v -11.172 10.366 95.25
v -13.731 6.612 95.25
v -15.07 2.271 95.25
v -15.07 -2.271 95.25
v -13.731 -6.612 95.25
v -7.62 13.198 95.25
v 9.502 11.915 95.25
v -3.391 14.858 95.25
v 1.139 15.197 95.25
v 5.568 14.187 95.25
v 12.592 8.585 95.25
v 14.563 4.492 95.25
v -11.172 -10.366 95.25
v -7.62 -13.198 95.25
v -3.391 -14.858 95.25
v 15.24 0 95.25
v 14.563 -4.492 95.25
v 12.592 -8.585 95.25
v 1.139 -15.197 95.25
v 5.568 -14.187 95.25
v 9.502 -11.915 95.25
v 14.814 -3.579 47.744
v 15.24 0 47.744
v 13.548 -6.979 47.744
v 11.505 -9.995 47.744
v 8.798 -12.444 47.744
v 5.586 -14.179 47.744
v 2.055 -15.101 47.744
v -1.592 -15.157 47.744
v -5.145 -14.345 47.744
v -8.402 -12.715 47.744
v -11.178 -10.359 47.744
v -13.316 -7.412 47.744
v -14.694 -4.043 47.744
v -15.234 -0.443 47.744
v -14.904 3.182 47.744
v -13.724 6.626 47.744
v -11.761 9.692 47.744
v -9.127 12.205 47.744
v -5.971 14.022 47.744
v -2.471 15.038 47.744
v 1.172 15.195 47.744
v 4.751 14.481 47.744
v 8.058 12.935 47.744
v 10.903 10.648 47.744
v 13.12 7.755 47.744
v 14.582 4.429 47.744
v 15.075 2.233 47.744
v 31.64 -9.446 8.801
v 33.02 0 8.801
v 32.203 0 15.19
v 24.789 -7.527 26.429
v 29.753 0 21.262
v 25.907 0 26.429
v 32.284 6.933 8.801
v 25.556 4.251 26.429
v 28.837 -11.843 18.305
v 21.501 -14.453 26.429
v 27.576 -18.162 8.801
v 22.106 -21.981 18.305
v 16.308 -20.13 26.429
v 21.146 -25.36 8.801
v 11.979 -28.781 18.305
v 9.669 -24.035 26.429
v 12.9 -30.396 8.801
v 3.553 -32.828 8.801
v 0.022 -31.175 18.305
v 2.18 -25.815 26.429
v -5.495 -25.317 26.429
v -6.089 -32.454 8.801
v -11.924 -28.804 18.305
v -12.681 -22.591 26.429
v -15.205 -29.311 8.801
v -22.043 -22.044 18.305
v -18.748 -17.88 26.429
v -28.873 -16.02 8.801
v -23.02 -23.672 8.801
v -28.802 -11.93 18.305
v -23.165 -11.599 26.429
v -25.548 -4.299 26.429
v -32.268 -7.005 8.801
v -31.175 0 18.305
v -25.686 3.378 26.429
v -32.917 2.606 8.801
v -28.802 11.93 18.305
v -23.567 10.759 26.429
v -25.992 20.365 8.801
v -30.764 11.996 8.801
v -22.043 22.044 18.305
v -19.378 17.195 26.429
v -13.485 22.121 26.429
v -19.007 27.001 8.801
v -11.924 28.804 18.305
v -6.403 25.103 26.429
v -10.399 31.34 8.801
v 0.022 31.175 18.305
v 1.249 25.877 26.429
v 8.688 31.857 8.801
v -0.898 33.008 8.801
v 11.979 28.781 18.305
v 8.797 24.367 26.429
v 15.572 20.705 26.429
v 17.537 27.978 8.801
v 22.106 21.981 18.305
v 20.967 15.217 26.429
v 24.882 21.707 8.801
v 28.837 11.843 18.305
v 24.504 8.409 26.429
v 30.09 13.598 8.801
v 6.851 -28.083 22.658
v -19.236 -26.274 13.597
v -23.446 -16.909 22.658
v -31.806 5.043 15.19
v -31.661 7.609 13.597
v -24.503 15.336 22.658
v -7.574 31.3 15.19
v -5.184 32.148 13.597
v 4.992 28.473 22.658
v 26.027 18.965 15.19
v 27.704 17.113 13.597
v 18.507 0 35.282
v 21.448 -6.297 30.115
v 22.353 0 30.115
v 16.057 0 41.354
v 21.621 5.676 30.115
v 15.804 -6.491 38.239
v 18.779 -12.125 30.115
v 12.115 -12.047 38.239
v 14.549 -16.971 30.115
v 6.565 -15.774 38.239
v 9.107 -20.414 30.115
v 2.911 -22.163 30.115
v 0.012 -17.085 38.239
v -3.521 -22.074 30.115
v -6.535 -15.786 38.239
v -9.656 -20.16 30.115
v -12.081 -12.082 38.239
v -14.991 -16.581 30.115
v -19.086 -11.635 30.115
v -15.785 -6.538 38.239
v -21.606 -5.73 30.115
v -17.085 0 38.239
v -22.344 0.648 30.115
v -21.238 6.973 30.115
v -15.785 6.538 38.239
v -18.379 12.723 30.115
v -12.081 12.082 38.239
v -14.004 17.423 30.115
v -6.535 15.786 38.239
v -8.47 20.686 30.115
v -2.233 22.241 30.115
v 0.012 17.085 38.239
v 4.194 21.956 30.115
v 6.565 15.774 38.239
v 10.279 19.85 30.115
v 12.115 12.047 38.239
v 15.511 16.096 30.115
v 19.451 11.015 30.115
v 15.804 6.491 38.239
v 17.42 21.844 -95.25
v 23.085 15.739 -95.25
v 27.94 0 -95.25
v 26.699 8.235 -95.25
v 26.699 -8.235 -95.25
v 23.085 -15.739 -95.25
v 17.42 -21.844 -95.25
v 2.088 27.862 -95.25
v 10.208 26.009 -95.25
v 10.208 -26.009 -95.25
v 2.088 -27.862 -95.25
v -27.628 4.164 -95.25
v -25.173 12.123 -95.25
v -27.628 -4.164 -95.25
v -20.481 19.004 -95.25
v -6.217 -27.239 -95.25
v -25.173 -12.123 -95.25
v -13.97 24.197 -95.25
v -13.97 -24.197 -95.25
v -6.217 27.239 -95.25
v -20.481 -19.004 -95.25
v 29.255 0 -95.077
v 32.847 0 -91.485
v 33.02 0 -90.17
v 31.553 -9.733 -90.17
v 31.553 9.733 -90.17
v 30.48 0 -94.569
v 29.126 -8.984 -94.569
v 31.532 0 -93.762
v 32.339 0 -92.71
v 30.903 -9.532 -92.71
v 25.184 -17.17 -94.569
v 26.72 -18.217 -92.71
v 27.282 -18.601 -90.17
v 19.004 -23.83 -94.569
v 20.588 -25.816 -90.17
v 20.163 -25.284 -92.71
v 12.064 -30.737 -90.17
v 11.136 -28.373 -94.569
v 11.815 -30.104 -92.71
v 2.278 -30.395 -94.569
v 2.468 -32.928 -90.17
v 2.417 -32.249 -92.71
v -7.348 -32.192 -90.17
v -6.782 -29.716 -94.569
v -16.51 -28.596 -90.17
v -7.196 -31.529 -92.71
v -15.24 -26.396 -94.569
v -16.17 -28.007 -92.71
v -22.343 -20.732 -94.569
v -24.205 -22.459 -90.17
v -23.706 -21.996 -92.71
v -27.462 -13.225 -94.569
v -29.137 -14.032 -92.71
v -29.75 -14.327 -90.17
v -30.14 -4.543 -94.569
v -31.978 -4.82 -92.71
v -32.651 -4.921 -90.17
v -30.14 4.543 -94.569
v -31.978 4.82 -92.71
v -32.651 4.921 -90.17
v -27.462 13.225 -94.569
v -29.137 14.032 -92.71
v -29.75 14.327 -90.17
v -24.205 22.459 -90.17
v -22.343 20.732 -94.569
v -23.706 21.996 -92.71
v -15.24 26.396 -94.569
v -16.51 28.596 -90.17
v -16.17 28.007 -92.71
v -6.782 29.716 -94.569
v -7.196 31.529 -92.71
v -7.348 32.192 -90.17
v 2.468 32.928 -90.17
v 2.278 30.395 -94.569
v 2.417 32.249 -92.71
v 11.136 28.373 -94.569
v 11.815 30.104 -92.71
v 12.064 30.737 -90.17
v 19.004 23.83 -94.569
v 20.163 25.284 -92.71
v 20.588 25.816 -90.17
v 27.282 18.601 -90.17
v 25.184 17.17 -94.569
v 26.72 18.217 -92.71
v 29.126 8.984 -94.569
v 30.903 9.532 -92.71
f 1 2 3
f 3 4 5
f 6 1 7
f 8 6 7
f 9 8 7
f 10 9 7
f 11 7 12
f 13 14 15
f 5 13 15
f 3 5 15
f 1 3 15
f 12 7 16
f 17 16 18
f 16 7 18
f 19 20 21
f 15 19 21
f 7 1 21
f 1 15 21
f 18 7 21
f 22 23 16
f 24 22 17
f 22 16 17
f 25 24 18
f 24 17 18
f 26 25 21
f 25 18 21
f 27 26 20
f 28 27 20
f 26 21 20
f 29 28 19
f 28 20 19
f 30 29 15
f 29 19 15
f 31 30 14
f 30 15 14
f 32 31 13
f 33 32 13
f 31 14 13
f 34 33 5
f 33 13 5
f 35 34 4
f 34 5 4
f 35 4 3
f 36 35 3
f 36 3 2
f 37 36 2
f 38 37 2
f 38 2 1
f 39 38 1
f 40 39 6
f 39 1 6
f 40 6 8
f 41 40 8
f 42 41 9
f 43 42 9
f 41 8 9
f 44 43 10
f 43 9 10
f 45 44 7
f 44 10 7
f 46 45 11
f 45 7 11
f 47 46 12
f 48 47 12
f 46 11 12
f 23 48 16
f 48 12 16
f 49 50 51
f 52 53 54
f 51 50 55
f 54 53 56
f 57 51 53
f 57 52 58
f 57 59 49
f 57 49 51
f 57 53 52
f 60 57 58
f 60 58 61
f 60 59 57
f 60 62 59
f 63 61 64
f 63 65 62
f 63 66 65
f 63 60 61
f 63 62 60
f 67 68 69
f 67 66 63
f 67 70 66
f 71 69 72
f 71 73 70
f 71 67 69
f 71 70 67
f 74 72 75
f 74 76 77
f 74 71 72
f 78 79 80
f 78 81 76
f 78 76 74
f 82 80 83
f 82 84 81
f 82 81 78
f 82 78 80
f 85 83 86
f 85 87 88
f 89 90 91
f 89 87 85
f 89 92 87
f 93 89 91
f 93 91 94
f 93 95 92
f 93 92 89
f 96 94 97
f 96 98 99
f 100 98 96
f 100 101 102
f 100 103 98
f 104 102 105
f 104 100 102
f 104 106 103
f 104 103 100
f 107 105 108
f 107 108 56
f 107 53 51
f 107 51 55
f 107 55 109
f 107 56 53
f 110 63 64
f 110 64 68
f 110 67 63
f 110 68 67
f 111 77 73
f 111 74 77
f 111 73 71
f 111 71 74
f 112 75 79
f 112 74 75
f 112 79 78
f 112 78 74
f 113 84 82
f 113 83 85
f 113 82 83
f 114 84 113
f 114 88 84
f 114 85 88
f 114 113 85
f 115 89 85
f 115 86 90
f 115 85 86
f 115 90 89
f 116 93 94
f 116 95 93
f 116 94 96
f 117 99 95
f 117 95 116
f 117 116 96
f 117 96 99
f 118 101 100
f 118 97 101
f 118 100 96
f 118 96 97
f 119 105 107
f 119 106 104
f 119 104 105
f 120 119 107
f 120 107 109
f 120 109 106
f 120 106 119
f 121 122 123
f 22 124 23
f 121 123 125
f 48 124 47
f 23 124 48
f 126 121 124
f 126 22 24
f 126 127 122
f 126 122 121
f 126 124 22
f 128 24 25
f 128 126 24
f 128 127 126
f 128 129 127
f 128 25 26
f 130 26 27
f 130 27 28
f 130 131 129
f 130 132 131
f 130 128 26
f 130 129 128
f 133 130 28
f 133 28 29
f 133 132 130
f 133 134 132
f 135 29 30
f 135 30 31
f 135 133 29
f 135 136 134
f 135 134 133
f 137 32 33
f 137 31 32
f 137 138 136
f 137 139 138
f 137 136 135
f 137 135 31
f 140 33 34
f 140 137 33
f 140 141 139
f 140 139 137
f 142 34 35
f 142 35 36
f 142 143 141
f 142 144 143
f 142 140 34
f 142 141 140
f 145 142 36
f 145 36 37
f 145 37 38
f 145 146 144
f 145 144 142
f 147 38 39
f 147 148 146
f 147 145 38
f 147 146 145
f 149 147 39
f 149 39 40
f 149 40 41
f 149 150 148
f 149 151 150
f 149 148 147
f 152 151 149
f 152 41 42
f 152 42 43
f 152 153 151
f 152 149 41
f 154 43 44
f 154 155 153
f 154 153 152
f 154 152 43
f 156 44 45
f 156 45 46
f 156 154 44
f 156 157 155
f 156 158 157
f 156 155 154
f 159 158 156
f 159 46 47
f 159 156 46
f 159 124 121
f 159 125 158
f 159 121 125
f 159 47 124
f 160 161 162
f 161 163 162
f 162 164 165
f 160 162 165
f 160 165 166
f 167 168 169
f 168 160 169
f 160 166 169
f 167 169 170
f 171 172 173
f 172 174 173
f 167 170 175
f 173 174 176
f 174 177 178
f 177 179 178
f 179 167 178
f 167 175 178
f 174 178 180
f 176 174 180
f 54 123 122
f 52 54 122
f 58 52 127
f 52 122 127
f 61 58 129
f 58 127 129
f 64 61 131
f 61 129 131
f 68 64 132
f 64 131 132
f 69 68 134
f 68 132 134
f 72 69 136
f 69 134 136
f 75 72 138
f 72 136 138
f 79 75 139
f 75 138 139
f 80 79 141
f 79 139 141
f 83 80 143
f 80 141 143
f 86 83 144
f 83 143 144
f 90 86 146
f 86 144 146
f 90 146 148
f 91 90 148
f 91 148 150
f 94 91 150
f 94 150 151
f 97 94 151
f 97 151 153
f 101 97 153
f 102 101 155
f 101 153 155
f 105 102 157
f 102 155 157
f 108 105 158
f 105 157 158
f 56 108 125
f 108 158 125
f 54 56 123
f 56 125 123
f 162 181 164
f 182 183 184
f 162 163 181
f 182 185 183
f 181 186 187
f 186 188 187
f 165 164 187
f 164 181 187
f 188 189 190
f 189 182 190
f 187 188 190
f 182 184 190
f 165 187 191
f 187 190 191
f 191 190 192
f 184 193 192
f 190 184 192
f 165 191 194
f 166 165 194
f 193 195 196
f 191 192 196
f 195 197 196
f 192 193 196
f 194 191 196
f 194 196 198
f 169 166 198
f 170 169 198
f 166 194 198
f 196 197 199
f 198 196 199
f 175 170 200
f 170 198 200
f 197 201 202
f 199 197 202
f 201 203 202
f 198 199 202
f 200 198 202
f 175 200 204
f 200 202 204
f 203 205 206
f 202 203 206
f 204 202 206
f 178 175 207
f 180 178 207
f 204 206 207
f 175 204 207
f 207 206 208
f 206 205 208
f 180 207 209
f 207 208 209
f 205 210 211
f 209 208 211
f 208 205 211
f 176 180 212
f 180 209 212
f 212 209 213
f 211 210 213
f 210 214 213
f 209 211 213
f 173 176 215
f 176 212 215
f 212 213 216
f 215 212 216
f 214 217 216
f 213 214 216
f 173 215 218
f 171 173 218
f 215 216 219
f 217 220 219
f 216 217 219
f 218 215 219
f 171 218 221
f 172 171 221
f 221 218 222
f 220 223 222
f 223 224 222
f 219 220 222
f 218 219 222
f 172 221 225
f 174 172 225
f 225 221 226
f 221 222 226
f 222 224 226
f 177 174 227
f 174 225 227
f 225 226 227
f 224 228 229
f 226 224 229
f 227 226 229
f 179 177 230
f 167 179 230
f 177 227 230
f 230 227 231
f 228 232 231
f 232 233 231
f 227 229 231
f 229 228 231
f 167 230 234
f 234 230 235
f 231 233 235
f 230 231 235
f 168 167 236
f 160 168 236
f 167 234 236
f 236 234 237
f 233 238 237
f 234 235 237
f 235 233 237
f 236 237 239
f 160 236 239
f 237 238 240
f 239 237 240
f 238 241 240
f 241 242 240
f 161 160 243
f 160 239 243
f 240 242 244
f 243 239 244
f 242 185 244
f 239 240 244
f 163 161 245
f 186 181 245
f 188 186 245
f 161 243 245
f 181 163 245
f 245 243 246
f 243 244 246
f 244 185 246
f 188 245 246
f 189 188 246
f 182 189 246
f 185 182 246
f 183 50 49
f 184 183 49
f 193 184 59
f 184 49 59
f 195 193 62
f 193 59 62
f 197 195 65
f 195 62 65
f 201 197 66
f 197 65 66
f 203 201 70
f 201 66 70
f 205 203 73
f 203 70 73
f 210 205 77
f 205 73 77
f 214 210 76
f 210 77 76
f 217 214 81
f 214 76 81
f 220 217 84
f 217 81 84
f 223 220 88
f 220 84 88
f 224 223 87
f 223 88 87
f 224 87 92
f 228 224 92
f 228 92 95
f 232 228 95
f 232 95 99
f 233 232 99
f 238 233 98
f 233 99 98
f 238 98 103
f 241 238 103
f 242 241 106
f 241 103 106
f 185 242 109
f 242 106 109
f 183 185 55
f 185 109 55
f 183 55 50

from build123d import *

# Parameters (mm, degrees)
F2_R = 5.08
F3_R = 25.4


with BuildPart() as f1:
    # F0 (on Front) → F1 (revolve)
    with BuildSketch(Plane.XZ):
        Polygon((15.24, 95.25), (0, 95.25), (0, -95.25), (33.02, -95.25), (33.02, 19.05), (15.24, 37.494287), align=None)
    revolve(axis=Axis((0, 0, 2.313137), (0, 0, -1)))

    # F2
    f2_edges = [f1.edges().sort_by_distance(p)[0] for p in [
        (-33.02, 0, -95.25),
    ]]
    fillet(f2_edges, radius=F2_R)

    # F3
    f3_edges = [f1.edges().sort_by_distance(p)[0] for p in [
        (-33.02, 0, 19.05),
        (-15.24, 0, 37.494287),
    ]]
    fillet(f3_edges, radius=F3_R)


solid = f1.part
